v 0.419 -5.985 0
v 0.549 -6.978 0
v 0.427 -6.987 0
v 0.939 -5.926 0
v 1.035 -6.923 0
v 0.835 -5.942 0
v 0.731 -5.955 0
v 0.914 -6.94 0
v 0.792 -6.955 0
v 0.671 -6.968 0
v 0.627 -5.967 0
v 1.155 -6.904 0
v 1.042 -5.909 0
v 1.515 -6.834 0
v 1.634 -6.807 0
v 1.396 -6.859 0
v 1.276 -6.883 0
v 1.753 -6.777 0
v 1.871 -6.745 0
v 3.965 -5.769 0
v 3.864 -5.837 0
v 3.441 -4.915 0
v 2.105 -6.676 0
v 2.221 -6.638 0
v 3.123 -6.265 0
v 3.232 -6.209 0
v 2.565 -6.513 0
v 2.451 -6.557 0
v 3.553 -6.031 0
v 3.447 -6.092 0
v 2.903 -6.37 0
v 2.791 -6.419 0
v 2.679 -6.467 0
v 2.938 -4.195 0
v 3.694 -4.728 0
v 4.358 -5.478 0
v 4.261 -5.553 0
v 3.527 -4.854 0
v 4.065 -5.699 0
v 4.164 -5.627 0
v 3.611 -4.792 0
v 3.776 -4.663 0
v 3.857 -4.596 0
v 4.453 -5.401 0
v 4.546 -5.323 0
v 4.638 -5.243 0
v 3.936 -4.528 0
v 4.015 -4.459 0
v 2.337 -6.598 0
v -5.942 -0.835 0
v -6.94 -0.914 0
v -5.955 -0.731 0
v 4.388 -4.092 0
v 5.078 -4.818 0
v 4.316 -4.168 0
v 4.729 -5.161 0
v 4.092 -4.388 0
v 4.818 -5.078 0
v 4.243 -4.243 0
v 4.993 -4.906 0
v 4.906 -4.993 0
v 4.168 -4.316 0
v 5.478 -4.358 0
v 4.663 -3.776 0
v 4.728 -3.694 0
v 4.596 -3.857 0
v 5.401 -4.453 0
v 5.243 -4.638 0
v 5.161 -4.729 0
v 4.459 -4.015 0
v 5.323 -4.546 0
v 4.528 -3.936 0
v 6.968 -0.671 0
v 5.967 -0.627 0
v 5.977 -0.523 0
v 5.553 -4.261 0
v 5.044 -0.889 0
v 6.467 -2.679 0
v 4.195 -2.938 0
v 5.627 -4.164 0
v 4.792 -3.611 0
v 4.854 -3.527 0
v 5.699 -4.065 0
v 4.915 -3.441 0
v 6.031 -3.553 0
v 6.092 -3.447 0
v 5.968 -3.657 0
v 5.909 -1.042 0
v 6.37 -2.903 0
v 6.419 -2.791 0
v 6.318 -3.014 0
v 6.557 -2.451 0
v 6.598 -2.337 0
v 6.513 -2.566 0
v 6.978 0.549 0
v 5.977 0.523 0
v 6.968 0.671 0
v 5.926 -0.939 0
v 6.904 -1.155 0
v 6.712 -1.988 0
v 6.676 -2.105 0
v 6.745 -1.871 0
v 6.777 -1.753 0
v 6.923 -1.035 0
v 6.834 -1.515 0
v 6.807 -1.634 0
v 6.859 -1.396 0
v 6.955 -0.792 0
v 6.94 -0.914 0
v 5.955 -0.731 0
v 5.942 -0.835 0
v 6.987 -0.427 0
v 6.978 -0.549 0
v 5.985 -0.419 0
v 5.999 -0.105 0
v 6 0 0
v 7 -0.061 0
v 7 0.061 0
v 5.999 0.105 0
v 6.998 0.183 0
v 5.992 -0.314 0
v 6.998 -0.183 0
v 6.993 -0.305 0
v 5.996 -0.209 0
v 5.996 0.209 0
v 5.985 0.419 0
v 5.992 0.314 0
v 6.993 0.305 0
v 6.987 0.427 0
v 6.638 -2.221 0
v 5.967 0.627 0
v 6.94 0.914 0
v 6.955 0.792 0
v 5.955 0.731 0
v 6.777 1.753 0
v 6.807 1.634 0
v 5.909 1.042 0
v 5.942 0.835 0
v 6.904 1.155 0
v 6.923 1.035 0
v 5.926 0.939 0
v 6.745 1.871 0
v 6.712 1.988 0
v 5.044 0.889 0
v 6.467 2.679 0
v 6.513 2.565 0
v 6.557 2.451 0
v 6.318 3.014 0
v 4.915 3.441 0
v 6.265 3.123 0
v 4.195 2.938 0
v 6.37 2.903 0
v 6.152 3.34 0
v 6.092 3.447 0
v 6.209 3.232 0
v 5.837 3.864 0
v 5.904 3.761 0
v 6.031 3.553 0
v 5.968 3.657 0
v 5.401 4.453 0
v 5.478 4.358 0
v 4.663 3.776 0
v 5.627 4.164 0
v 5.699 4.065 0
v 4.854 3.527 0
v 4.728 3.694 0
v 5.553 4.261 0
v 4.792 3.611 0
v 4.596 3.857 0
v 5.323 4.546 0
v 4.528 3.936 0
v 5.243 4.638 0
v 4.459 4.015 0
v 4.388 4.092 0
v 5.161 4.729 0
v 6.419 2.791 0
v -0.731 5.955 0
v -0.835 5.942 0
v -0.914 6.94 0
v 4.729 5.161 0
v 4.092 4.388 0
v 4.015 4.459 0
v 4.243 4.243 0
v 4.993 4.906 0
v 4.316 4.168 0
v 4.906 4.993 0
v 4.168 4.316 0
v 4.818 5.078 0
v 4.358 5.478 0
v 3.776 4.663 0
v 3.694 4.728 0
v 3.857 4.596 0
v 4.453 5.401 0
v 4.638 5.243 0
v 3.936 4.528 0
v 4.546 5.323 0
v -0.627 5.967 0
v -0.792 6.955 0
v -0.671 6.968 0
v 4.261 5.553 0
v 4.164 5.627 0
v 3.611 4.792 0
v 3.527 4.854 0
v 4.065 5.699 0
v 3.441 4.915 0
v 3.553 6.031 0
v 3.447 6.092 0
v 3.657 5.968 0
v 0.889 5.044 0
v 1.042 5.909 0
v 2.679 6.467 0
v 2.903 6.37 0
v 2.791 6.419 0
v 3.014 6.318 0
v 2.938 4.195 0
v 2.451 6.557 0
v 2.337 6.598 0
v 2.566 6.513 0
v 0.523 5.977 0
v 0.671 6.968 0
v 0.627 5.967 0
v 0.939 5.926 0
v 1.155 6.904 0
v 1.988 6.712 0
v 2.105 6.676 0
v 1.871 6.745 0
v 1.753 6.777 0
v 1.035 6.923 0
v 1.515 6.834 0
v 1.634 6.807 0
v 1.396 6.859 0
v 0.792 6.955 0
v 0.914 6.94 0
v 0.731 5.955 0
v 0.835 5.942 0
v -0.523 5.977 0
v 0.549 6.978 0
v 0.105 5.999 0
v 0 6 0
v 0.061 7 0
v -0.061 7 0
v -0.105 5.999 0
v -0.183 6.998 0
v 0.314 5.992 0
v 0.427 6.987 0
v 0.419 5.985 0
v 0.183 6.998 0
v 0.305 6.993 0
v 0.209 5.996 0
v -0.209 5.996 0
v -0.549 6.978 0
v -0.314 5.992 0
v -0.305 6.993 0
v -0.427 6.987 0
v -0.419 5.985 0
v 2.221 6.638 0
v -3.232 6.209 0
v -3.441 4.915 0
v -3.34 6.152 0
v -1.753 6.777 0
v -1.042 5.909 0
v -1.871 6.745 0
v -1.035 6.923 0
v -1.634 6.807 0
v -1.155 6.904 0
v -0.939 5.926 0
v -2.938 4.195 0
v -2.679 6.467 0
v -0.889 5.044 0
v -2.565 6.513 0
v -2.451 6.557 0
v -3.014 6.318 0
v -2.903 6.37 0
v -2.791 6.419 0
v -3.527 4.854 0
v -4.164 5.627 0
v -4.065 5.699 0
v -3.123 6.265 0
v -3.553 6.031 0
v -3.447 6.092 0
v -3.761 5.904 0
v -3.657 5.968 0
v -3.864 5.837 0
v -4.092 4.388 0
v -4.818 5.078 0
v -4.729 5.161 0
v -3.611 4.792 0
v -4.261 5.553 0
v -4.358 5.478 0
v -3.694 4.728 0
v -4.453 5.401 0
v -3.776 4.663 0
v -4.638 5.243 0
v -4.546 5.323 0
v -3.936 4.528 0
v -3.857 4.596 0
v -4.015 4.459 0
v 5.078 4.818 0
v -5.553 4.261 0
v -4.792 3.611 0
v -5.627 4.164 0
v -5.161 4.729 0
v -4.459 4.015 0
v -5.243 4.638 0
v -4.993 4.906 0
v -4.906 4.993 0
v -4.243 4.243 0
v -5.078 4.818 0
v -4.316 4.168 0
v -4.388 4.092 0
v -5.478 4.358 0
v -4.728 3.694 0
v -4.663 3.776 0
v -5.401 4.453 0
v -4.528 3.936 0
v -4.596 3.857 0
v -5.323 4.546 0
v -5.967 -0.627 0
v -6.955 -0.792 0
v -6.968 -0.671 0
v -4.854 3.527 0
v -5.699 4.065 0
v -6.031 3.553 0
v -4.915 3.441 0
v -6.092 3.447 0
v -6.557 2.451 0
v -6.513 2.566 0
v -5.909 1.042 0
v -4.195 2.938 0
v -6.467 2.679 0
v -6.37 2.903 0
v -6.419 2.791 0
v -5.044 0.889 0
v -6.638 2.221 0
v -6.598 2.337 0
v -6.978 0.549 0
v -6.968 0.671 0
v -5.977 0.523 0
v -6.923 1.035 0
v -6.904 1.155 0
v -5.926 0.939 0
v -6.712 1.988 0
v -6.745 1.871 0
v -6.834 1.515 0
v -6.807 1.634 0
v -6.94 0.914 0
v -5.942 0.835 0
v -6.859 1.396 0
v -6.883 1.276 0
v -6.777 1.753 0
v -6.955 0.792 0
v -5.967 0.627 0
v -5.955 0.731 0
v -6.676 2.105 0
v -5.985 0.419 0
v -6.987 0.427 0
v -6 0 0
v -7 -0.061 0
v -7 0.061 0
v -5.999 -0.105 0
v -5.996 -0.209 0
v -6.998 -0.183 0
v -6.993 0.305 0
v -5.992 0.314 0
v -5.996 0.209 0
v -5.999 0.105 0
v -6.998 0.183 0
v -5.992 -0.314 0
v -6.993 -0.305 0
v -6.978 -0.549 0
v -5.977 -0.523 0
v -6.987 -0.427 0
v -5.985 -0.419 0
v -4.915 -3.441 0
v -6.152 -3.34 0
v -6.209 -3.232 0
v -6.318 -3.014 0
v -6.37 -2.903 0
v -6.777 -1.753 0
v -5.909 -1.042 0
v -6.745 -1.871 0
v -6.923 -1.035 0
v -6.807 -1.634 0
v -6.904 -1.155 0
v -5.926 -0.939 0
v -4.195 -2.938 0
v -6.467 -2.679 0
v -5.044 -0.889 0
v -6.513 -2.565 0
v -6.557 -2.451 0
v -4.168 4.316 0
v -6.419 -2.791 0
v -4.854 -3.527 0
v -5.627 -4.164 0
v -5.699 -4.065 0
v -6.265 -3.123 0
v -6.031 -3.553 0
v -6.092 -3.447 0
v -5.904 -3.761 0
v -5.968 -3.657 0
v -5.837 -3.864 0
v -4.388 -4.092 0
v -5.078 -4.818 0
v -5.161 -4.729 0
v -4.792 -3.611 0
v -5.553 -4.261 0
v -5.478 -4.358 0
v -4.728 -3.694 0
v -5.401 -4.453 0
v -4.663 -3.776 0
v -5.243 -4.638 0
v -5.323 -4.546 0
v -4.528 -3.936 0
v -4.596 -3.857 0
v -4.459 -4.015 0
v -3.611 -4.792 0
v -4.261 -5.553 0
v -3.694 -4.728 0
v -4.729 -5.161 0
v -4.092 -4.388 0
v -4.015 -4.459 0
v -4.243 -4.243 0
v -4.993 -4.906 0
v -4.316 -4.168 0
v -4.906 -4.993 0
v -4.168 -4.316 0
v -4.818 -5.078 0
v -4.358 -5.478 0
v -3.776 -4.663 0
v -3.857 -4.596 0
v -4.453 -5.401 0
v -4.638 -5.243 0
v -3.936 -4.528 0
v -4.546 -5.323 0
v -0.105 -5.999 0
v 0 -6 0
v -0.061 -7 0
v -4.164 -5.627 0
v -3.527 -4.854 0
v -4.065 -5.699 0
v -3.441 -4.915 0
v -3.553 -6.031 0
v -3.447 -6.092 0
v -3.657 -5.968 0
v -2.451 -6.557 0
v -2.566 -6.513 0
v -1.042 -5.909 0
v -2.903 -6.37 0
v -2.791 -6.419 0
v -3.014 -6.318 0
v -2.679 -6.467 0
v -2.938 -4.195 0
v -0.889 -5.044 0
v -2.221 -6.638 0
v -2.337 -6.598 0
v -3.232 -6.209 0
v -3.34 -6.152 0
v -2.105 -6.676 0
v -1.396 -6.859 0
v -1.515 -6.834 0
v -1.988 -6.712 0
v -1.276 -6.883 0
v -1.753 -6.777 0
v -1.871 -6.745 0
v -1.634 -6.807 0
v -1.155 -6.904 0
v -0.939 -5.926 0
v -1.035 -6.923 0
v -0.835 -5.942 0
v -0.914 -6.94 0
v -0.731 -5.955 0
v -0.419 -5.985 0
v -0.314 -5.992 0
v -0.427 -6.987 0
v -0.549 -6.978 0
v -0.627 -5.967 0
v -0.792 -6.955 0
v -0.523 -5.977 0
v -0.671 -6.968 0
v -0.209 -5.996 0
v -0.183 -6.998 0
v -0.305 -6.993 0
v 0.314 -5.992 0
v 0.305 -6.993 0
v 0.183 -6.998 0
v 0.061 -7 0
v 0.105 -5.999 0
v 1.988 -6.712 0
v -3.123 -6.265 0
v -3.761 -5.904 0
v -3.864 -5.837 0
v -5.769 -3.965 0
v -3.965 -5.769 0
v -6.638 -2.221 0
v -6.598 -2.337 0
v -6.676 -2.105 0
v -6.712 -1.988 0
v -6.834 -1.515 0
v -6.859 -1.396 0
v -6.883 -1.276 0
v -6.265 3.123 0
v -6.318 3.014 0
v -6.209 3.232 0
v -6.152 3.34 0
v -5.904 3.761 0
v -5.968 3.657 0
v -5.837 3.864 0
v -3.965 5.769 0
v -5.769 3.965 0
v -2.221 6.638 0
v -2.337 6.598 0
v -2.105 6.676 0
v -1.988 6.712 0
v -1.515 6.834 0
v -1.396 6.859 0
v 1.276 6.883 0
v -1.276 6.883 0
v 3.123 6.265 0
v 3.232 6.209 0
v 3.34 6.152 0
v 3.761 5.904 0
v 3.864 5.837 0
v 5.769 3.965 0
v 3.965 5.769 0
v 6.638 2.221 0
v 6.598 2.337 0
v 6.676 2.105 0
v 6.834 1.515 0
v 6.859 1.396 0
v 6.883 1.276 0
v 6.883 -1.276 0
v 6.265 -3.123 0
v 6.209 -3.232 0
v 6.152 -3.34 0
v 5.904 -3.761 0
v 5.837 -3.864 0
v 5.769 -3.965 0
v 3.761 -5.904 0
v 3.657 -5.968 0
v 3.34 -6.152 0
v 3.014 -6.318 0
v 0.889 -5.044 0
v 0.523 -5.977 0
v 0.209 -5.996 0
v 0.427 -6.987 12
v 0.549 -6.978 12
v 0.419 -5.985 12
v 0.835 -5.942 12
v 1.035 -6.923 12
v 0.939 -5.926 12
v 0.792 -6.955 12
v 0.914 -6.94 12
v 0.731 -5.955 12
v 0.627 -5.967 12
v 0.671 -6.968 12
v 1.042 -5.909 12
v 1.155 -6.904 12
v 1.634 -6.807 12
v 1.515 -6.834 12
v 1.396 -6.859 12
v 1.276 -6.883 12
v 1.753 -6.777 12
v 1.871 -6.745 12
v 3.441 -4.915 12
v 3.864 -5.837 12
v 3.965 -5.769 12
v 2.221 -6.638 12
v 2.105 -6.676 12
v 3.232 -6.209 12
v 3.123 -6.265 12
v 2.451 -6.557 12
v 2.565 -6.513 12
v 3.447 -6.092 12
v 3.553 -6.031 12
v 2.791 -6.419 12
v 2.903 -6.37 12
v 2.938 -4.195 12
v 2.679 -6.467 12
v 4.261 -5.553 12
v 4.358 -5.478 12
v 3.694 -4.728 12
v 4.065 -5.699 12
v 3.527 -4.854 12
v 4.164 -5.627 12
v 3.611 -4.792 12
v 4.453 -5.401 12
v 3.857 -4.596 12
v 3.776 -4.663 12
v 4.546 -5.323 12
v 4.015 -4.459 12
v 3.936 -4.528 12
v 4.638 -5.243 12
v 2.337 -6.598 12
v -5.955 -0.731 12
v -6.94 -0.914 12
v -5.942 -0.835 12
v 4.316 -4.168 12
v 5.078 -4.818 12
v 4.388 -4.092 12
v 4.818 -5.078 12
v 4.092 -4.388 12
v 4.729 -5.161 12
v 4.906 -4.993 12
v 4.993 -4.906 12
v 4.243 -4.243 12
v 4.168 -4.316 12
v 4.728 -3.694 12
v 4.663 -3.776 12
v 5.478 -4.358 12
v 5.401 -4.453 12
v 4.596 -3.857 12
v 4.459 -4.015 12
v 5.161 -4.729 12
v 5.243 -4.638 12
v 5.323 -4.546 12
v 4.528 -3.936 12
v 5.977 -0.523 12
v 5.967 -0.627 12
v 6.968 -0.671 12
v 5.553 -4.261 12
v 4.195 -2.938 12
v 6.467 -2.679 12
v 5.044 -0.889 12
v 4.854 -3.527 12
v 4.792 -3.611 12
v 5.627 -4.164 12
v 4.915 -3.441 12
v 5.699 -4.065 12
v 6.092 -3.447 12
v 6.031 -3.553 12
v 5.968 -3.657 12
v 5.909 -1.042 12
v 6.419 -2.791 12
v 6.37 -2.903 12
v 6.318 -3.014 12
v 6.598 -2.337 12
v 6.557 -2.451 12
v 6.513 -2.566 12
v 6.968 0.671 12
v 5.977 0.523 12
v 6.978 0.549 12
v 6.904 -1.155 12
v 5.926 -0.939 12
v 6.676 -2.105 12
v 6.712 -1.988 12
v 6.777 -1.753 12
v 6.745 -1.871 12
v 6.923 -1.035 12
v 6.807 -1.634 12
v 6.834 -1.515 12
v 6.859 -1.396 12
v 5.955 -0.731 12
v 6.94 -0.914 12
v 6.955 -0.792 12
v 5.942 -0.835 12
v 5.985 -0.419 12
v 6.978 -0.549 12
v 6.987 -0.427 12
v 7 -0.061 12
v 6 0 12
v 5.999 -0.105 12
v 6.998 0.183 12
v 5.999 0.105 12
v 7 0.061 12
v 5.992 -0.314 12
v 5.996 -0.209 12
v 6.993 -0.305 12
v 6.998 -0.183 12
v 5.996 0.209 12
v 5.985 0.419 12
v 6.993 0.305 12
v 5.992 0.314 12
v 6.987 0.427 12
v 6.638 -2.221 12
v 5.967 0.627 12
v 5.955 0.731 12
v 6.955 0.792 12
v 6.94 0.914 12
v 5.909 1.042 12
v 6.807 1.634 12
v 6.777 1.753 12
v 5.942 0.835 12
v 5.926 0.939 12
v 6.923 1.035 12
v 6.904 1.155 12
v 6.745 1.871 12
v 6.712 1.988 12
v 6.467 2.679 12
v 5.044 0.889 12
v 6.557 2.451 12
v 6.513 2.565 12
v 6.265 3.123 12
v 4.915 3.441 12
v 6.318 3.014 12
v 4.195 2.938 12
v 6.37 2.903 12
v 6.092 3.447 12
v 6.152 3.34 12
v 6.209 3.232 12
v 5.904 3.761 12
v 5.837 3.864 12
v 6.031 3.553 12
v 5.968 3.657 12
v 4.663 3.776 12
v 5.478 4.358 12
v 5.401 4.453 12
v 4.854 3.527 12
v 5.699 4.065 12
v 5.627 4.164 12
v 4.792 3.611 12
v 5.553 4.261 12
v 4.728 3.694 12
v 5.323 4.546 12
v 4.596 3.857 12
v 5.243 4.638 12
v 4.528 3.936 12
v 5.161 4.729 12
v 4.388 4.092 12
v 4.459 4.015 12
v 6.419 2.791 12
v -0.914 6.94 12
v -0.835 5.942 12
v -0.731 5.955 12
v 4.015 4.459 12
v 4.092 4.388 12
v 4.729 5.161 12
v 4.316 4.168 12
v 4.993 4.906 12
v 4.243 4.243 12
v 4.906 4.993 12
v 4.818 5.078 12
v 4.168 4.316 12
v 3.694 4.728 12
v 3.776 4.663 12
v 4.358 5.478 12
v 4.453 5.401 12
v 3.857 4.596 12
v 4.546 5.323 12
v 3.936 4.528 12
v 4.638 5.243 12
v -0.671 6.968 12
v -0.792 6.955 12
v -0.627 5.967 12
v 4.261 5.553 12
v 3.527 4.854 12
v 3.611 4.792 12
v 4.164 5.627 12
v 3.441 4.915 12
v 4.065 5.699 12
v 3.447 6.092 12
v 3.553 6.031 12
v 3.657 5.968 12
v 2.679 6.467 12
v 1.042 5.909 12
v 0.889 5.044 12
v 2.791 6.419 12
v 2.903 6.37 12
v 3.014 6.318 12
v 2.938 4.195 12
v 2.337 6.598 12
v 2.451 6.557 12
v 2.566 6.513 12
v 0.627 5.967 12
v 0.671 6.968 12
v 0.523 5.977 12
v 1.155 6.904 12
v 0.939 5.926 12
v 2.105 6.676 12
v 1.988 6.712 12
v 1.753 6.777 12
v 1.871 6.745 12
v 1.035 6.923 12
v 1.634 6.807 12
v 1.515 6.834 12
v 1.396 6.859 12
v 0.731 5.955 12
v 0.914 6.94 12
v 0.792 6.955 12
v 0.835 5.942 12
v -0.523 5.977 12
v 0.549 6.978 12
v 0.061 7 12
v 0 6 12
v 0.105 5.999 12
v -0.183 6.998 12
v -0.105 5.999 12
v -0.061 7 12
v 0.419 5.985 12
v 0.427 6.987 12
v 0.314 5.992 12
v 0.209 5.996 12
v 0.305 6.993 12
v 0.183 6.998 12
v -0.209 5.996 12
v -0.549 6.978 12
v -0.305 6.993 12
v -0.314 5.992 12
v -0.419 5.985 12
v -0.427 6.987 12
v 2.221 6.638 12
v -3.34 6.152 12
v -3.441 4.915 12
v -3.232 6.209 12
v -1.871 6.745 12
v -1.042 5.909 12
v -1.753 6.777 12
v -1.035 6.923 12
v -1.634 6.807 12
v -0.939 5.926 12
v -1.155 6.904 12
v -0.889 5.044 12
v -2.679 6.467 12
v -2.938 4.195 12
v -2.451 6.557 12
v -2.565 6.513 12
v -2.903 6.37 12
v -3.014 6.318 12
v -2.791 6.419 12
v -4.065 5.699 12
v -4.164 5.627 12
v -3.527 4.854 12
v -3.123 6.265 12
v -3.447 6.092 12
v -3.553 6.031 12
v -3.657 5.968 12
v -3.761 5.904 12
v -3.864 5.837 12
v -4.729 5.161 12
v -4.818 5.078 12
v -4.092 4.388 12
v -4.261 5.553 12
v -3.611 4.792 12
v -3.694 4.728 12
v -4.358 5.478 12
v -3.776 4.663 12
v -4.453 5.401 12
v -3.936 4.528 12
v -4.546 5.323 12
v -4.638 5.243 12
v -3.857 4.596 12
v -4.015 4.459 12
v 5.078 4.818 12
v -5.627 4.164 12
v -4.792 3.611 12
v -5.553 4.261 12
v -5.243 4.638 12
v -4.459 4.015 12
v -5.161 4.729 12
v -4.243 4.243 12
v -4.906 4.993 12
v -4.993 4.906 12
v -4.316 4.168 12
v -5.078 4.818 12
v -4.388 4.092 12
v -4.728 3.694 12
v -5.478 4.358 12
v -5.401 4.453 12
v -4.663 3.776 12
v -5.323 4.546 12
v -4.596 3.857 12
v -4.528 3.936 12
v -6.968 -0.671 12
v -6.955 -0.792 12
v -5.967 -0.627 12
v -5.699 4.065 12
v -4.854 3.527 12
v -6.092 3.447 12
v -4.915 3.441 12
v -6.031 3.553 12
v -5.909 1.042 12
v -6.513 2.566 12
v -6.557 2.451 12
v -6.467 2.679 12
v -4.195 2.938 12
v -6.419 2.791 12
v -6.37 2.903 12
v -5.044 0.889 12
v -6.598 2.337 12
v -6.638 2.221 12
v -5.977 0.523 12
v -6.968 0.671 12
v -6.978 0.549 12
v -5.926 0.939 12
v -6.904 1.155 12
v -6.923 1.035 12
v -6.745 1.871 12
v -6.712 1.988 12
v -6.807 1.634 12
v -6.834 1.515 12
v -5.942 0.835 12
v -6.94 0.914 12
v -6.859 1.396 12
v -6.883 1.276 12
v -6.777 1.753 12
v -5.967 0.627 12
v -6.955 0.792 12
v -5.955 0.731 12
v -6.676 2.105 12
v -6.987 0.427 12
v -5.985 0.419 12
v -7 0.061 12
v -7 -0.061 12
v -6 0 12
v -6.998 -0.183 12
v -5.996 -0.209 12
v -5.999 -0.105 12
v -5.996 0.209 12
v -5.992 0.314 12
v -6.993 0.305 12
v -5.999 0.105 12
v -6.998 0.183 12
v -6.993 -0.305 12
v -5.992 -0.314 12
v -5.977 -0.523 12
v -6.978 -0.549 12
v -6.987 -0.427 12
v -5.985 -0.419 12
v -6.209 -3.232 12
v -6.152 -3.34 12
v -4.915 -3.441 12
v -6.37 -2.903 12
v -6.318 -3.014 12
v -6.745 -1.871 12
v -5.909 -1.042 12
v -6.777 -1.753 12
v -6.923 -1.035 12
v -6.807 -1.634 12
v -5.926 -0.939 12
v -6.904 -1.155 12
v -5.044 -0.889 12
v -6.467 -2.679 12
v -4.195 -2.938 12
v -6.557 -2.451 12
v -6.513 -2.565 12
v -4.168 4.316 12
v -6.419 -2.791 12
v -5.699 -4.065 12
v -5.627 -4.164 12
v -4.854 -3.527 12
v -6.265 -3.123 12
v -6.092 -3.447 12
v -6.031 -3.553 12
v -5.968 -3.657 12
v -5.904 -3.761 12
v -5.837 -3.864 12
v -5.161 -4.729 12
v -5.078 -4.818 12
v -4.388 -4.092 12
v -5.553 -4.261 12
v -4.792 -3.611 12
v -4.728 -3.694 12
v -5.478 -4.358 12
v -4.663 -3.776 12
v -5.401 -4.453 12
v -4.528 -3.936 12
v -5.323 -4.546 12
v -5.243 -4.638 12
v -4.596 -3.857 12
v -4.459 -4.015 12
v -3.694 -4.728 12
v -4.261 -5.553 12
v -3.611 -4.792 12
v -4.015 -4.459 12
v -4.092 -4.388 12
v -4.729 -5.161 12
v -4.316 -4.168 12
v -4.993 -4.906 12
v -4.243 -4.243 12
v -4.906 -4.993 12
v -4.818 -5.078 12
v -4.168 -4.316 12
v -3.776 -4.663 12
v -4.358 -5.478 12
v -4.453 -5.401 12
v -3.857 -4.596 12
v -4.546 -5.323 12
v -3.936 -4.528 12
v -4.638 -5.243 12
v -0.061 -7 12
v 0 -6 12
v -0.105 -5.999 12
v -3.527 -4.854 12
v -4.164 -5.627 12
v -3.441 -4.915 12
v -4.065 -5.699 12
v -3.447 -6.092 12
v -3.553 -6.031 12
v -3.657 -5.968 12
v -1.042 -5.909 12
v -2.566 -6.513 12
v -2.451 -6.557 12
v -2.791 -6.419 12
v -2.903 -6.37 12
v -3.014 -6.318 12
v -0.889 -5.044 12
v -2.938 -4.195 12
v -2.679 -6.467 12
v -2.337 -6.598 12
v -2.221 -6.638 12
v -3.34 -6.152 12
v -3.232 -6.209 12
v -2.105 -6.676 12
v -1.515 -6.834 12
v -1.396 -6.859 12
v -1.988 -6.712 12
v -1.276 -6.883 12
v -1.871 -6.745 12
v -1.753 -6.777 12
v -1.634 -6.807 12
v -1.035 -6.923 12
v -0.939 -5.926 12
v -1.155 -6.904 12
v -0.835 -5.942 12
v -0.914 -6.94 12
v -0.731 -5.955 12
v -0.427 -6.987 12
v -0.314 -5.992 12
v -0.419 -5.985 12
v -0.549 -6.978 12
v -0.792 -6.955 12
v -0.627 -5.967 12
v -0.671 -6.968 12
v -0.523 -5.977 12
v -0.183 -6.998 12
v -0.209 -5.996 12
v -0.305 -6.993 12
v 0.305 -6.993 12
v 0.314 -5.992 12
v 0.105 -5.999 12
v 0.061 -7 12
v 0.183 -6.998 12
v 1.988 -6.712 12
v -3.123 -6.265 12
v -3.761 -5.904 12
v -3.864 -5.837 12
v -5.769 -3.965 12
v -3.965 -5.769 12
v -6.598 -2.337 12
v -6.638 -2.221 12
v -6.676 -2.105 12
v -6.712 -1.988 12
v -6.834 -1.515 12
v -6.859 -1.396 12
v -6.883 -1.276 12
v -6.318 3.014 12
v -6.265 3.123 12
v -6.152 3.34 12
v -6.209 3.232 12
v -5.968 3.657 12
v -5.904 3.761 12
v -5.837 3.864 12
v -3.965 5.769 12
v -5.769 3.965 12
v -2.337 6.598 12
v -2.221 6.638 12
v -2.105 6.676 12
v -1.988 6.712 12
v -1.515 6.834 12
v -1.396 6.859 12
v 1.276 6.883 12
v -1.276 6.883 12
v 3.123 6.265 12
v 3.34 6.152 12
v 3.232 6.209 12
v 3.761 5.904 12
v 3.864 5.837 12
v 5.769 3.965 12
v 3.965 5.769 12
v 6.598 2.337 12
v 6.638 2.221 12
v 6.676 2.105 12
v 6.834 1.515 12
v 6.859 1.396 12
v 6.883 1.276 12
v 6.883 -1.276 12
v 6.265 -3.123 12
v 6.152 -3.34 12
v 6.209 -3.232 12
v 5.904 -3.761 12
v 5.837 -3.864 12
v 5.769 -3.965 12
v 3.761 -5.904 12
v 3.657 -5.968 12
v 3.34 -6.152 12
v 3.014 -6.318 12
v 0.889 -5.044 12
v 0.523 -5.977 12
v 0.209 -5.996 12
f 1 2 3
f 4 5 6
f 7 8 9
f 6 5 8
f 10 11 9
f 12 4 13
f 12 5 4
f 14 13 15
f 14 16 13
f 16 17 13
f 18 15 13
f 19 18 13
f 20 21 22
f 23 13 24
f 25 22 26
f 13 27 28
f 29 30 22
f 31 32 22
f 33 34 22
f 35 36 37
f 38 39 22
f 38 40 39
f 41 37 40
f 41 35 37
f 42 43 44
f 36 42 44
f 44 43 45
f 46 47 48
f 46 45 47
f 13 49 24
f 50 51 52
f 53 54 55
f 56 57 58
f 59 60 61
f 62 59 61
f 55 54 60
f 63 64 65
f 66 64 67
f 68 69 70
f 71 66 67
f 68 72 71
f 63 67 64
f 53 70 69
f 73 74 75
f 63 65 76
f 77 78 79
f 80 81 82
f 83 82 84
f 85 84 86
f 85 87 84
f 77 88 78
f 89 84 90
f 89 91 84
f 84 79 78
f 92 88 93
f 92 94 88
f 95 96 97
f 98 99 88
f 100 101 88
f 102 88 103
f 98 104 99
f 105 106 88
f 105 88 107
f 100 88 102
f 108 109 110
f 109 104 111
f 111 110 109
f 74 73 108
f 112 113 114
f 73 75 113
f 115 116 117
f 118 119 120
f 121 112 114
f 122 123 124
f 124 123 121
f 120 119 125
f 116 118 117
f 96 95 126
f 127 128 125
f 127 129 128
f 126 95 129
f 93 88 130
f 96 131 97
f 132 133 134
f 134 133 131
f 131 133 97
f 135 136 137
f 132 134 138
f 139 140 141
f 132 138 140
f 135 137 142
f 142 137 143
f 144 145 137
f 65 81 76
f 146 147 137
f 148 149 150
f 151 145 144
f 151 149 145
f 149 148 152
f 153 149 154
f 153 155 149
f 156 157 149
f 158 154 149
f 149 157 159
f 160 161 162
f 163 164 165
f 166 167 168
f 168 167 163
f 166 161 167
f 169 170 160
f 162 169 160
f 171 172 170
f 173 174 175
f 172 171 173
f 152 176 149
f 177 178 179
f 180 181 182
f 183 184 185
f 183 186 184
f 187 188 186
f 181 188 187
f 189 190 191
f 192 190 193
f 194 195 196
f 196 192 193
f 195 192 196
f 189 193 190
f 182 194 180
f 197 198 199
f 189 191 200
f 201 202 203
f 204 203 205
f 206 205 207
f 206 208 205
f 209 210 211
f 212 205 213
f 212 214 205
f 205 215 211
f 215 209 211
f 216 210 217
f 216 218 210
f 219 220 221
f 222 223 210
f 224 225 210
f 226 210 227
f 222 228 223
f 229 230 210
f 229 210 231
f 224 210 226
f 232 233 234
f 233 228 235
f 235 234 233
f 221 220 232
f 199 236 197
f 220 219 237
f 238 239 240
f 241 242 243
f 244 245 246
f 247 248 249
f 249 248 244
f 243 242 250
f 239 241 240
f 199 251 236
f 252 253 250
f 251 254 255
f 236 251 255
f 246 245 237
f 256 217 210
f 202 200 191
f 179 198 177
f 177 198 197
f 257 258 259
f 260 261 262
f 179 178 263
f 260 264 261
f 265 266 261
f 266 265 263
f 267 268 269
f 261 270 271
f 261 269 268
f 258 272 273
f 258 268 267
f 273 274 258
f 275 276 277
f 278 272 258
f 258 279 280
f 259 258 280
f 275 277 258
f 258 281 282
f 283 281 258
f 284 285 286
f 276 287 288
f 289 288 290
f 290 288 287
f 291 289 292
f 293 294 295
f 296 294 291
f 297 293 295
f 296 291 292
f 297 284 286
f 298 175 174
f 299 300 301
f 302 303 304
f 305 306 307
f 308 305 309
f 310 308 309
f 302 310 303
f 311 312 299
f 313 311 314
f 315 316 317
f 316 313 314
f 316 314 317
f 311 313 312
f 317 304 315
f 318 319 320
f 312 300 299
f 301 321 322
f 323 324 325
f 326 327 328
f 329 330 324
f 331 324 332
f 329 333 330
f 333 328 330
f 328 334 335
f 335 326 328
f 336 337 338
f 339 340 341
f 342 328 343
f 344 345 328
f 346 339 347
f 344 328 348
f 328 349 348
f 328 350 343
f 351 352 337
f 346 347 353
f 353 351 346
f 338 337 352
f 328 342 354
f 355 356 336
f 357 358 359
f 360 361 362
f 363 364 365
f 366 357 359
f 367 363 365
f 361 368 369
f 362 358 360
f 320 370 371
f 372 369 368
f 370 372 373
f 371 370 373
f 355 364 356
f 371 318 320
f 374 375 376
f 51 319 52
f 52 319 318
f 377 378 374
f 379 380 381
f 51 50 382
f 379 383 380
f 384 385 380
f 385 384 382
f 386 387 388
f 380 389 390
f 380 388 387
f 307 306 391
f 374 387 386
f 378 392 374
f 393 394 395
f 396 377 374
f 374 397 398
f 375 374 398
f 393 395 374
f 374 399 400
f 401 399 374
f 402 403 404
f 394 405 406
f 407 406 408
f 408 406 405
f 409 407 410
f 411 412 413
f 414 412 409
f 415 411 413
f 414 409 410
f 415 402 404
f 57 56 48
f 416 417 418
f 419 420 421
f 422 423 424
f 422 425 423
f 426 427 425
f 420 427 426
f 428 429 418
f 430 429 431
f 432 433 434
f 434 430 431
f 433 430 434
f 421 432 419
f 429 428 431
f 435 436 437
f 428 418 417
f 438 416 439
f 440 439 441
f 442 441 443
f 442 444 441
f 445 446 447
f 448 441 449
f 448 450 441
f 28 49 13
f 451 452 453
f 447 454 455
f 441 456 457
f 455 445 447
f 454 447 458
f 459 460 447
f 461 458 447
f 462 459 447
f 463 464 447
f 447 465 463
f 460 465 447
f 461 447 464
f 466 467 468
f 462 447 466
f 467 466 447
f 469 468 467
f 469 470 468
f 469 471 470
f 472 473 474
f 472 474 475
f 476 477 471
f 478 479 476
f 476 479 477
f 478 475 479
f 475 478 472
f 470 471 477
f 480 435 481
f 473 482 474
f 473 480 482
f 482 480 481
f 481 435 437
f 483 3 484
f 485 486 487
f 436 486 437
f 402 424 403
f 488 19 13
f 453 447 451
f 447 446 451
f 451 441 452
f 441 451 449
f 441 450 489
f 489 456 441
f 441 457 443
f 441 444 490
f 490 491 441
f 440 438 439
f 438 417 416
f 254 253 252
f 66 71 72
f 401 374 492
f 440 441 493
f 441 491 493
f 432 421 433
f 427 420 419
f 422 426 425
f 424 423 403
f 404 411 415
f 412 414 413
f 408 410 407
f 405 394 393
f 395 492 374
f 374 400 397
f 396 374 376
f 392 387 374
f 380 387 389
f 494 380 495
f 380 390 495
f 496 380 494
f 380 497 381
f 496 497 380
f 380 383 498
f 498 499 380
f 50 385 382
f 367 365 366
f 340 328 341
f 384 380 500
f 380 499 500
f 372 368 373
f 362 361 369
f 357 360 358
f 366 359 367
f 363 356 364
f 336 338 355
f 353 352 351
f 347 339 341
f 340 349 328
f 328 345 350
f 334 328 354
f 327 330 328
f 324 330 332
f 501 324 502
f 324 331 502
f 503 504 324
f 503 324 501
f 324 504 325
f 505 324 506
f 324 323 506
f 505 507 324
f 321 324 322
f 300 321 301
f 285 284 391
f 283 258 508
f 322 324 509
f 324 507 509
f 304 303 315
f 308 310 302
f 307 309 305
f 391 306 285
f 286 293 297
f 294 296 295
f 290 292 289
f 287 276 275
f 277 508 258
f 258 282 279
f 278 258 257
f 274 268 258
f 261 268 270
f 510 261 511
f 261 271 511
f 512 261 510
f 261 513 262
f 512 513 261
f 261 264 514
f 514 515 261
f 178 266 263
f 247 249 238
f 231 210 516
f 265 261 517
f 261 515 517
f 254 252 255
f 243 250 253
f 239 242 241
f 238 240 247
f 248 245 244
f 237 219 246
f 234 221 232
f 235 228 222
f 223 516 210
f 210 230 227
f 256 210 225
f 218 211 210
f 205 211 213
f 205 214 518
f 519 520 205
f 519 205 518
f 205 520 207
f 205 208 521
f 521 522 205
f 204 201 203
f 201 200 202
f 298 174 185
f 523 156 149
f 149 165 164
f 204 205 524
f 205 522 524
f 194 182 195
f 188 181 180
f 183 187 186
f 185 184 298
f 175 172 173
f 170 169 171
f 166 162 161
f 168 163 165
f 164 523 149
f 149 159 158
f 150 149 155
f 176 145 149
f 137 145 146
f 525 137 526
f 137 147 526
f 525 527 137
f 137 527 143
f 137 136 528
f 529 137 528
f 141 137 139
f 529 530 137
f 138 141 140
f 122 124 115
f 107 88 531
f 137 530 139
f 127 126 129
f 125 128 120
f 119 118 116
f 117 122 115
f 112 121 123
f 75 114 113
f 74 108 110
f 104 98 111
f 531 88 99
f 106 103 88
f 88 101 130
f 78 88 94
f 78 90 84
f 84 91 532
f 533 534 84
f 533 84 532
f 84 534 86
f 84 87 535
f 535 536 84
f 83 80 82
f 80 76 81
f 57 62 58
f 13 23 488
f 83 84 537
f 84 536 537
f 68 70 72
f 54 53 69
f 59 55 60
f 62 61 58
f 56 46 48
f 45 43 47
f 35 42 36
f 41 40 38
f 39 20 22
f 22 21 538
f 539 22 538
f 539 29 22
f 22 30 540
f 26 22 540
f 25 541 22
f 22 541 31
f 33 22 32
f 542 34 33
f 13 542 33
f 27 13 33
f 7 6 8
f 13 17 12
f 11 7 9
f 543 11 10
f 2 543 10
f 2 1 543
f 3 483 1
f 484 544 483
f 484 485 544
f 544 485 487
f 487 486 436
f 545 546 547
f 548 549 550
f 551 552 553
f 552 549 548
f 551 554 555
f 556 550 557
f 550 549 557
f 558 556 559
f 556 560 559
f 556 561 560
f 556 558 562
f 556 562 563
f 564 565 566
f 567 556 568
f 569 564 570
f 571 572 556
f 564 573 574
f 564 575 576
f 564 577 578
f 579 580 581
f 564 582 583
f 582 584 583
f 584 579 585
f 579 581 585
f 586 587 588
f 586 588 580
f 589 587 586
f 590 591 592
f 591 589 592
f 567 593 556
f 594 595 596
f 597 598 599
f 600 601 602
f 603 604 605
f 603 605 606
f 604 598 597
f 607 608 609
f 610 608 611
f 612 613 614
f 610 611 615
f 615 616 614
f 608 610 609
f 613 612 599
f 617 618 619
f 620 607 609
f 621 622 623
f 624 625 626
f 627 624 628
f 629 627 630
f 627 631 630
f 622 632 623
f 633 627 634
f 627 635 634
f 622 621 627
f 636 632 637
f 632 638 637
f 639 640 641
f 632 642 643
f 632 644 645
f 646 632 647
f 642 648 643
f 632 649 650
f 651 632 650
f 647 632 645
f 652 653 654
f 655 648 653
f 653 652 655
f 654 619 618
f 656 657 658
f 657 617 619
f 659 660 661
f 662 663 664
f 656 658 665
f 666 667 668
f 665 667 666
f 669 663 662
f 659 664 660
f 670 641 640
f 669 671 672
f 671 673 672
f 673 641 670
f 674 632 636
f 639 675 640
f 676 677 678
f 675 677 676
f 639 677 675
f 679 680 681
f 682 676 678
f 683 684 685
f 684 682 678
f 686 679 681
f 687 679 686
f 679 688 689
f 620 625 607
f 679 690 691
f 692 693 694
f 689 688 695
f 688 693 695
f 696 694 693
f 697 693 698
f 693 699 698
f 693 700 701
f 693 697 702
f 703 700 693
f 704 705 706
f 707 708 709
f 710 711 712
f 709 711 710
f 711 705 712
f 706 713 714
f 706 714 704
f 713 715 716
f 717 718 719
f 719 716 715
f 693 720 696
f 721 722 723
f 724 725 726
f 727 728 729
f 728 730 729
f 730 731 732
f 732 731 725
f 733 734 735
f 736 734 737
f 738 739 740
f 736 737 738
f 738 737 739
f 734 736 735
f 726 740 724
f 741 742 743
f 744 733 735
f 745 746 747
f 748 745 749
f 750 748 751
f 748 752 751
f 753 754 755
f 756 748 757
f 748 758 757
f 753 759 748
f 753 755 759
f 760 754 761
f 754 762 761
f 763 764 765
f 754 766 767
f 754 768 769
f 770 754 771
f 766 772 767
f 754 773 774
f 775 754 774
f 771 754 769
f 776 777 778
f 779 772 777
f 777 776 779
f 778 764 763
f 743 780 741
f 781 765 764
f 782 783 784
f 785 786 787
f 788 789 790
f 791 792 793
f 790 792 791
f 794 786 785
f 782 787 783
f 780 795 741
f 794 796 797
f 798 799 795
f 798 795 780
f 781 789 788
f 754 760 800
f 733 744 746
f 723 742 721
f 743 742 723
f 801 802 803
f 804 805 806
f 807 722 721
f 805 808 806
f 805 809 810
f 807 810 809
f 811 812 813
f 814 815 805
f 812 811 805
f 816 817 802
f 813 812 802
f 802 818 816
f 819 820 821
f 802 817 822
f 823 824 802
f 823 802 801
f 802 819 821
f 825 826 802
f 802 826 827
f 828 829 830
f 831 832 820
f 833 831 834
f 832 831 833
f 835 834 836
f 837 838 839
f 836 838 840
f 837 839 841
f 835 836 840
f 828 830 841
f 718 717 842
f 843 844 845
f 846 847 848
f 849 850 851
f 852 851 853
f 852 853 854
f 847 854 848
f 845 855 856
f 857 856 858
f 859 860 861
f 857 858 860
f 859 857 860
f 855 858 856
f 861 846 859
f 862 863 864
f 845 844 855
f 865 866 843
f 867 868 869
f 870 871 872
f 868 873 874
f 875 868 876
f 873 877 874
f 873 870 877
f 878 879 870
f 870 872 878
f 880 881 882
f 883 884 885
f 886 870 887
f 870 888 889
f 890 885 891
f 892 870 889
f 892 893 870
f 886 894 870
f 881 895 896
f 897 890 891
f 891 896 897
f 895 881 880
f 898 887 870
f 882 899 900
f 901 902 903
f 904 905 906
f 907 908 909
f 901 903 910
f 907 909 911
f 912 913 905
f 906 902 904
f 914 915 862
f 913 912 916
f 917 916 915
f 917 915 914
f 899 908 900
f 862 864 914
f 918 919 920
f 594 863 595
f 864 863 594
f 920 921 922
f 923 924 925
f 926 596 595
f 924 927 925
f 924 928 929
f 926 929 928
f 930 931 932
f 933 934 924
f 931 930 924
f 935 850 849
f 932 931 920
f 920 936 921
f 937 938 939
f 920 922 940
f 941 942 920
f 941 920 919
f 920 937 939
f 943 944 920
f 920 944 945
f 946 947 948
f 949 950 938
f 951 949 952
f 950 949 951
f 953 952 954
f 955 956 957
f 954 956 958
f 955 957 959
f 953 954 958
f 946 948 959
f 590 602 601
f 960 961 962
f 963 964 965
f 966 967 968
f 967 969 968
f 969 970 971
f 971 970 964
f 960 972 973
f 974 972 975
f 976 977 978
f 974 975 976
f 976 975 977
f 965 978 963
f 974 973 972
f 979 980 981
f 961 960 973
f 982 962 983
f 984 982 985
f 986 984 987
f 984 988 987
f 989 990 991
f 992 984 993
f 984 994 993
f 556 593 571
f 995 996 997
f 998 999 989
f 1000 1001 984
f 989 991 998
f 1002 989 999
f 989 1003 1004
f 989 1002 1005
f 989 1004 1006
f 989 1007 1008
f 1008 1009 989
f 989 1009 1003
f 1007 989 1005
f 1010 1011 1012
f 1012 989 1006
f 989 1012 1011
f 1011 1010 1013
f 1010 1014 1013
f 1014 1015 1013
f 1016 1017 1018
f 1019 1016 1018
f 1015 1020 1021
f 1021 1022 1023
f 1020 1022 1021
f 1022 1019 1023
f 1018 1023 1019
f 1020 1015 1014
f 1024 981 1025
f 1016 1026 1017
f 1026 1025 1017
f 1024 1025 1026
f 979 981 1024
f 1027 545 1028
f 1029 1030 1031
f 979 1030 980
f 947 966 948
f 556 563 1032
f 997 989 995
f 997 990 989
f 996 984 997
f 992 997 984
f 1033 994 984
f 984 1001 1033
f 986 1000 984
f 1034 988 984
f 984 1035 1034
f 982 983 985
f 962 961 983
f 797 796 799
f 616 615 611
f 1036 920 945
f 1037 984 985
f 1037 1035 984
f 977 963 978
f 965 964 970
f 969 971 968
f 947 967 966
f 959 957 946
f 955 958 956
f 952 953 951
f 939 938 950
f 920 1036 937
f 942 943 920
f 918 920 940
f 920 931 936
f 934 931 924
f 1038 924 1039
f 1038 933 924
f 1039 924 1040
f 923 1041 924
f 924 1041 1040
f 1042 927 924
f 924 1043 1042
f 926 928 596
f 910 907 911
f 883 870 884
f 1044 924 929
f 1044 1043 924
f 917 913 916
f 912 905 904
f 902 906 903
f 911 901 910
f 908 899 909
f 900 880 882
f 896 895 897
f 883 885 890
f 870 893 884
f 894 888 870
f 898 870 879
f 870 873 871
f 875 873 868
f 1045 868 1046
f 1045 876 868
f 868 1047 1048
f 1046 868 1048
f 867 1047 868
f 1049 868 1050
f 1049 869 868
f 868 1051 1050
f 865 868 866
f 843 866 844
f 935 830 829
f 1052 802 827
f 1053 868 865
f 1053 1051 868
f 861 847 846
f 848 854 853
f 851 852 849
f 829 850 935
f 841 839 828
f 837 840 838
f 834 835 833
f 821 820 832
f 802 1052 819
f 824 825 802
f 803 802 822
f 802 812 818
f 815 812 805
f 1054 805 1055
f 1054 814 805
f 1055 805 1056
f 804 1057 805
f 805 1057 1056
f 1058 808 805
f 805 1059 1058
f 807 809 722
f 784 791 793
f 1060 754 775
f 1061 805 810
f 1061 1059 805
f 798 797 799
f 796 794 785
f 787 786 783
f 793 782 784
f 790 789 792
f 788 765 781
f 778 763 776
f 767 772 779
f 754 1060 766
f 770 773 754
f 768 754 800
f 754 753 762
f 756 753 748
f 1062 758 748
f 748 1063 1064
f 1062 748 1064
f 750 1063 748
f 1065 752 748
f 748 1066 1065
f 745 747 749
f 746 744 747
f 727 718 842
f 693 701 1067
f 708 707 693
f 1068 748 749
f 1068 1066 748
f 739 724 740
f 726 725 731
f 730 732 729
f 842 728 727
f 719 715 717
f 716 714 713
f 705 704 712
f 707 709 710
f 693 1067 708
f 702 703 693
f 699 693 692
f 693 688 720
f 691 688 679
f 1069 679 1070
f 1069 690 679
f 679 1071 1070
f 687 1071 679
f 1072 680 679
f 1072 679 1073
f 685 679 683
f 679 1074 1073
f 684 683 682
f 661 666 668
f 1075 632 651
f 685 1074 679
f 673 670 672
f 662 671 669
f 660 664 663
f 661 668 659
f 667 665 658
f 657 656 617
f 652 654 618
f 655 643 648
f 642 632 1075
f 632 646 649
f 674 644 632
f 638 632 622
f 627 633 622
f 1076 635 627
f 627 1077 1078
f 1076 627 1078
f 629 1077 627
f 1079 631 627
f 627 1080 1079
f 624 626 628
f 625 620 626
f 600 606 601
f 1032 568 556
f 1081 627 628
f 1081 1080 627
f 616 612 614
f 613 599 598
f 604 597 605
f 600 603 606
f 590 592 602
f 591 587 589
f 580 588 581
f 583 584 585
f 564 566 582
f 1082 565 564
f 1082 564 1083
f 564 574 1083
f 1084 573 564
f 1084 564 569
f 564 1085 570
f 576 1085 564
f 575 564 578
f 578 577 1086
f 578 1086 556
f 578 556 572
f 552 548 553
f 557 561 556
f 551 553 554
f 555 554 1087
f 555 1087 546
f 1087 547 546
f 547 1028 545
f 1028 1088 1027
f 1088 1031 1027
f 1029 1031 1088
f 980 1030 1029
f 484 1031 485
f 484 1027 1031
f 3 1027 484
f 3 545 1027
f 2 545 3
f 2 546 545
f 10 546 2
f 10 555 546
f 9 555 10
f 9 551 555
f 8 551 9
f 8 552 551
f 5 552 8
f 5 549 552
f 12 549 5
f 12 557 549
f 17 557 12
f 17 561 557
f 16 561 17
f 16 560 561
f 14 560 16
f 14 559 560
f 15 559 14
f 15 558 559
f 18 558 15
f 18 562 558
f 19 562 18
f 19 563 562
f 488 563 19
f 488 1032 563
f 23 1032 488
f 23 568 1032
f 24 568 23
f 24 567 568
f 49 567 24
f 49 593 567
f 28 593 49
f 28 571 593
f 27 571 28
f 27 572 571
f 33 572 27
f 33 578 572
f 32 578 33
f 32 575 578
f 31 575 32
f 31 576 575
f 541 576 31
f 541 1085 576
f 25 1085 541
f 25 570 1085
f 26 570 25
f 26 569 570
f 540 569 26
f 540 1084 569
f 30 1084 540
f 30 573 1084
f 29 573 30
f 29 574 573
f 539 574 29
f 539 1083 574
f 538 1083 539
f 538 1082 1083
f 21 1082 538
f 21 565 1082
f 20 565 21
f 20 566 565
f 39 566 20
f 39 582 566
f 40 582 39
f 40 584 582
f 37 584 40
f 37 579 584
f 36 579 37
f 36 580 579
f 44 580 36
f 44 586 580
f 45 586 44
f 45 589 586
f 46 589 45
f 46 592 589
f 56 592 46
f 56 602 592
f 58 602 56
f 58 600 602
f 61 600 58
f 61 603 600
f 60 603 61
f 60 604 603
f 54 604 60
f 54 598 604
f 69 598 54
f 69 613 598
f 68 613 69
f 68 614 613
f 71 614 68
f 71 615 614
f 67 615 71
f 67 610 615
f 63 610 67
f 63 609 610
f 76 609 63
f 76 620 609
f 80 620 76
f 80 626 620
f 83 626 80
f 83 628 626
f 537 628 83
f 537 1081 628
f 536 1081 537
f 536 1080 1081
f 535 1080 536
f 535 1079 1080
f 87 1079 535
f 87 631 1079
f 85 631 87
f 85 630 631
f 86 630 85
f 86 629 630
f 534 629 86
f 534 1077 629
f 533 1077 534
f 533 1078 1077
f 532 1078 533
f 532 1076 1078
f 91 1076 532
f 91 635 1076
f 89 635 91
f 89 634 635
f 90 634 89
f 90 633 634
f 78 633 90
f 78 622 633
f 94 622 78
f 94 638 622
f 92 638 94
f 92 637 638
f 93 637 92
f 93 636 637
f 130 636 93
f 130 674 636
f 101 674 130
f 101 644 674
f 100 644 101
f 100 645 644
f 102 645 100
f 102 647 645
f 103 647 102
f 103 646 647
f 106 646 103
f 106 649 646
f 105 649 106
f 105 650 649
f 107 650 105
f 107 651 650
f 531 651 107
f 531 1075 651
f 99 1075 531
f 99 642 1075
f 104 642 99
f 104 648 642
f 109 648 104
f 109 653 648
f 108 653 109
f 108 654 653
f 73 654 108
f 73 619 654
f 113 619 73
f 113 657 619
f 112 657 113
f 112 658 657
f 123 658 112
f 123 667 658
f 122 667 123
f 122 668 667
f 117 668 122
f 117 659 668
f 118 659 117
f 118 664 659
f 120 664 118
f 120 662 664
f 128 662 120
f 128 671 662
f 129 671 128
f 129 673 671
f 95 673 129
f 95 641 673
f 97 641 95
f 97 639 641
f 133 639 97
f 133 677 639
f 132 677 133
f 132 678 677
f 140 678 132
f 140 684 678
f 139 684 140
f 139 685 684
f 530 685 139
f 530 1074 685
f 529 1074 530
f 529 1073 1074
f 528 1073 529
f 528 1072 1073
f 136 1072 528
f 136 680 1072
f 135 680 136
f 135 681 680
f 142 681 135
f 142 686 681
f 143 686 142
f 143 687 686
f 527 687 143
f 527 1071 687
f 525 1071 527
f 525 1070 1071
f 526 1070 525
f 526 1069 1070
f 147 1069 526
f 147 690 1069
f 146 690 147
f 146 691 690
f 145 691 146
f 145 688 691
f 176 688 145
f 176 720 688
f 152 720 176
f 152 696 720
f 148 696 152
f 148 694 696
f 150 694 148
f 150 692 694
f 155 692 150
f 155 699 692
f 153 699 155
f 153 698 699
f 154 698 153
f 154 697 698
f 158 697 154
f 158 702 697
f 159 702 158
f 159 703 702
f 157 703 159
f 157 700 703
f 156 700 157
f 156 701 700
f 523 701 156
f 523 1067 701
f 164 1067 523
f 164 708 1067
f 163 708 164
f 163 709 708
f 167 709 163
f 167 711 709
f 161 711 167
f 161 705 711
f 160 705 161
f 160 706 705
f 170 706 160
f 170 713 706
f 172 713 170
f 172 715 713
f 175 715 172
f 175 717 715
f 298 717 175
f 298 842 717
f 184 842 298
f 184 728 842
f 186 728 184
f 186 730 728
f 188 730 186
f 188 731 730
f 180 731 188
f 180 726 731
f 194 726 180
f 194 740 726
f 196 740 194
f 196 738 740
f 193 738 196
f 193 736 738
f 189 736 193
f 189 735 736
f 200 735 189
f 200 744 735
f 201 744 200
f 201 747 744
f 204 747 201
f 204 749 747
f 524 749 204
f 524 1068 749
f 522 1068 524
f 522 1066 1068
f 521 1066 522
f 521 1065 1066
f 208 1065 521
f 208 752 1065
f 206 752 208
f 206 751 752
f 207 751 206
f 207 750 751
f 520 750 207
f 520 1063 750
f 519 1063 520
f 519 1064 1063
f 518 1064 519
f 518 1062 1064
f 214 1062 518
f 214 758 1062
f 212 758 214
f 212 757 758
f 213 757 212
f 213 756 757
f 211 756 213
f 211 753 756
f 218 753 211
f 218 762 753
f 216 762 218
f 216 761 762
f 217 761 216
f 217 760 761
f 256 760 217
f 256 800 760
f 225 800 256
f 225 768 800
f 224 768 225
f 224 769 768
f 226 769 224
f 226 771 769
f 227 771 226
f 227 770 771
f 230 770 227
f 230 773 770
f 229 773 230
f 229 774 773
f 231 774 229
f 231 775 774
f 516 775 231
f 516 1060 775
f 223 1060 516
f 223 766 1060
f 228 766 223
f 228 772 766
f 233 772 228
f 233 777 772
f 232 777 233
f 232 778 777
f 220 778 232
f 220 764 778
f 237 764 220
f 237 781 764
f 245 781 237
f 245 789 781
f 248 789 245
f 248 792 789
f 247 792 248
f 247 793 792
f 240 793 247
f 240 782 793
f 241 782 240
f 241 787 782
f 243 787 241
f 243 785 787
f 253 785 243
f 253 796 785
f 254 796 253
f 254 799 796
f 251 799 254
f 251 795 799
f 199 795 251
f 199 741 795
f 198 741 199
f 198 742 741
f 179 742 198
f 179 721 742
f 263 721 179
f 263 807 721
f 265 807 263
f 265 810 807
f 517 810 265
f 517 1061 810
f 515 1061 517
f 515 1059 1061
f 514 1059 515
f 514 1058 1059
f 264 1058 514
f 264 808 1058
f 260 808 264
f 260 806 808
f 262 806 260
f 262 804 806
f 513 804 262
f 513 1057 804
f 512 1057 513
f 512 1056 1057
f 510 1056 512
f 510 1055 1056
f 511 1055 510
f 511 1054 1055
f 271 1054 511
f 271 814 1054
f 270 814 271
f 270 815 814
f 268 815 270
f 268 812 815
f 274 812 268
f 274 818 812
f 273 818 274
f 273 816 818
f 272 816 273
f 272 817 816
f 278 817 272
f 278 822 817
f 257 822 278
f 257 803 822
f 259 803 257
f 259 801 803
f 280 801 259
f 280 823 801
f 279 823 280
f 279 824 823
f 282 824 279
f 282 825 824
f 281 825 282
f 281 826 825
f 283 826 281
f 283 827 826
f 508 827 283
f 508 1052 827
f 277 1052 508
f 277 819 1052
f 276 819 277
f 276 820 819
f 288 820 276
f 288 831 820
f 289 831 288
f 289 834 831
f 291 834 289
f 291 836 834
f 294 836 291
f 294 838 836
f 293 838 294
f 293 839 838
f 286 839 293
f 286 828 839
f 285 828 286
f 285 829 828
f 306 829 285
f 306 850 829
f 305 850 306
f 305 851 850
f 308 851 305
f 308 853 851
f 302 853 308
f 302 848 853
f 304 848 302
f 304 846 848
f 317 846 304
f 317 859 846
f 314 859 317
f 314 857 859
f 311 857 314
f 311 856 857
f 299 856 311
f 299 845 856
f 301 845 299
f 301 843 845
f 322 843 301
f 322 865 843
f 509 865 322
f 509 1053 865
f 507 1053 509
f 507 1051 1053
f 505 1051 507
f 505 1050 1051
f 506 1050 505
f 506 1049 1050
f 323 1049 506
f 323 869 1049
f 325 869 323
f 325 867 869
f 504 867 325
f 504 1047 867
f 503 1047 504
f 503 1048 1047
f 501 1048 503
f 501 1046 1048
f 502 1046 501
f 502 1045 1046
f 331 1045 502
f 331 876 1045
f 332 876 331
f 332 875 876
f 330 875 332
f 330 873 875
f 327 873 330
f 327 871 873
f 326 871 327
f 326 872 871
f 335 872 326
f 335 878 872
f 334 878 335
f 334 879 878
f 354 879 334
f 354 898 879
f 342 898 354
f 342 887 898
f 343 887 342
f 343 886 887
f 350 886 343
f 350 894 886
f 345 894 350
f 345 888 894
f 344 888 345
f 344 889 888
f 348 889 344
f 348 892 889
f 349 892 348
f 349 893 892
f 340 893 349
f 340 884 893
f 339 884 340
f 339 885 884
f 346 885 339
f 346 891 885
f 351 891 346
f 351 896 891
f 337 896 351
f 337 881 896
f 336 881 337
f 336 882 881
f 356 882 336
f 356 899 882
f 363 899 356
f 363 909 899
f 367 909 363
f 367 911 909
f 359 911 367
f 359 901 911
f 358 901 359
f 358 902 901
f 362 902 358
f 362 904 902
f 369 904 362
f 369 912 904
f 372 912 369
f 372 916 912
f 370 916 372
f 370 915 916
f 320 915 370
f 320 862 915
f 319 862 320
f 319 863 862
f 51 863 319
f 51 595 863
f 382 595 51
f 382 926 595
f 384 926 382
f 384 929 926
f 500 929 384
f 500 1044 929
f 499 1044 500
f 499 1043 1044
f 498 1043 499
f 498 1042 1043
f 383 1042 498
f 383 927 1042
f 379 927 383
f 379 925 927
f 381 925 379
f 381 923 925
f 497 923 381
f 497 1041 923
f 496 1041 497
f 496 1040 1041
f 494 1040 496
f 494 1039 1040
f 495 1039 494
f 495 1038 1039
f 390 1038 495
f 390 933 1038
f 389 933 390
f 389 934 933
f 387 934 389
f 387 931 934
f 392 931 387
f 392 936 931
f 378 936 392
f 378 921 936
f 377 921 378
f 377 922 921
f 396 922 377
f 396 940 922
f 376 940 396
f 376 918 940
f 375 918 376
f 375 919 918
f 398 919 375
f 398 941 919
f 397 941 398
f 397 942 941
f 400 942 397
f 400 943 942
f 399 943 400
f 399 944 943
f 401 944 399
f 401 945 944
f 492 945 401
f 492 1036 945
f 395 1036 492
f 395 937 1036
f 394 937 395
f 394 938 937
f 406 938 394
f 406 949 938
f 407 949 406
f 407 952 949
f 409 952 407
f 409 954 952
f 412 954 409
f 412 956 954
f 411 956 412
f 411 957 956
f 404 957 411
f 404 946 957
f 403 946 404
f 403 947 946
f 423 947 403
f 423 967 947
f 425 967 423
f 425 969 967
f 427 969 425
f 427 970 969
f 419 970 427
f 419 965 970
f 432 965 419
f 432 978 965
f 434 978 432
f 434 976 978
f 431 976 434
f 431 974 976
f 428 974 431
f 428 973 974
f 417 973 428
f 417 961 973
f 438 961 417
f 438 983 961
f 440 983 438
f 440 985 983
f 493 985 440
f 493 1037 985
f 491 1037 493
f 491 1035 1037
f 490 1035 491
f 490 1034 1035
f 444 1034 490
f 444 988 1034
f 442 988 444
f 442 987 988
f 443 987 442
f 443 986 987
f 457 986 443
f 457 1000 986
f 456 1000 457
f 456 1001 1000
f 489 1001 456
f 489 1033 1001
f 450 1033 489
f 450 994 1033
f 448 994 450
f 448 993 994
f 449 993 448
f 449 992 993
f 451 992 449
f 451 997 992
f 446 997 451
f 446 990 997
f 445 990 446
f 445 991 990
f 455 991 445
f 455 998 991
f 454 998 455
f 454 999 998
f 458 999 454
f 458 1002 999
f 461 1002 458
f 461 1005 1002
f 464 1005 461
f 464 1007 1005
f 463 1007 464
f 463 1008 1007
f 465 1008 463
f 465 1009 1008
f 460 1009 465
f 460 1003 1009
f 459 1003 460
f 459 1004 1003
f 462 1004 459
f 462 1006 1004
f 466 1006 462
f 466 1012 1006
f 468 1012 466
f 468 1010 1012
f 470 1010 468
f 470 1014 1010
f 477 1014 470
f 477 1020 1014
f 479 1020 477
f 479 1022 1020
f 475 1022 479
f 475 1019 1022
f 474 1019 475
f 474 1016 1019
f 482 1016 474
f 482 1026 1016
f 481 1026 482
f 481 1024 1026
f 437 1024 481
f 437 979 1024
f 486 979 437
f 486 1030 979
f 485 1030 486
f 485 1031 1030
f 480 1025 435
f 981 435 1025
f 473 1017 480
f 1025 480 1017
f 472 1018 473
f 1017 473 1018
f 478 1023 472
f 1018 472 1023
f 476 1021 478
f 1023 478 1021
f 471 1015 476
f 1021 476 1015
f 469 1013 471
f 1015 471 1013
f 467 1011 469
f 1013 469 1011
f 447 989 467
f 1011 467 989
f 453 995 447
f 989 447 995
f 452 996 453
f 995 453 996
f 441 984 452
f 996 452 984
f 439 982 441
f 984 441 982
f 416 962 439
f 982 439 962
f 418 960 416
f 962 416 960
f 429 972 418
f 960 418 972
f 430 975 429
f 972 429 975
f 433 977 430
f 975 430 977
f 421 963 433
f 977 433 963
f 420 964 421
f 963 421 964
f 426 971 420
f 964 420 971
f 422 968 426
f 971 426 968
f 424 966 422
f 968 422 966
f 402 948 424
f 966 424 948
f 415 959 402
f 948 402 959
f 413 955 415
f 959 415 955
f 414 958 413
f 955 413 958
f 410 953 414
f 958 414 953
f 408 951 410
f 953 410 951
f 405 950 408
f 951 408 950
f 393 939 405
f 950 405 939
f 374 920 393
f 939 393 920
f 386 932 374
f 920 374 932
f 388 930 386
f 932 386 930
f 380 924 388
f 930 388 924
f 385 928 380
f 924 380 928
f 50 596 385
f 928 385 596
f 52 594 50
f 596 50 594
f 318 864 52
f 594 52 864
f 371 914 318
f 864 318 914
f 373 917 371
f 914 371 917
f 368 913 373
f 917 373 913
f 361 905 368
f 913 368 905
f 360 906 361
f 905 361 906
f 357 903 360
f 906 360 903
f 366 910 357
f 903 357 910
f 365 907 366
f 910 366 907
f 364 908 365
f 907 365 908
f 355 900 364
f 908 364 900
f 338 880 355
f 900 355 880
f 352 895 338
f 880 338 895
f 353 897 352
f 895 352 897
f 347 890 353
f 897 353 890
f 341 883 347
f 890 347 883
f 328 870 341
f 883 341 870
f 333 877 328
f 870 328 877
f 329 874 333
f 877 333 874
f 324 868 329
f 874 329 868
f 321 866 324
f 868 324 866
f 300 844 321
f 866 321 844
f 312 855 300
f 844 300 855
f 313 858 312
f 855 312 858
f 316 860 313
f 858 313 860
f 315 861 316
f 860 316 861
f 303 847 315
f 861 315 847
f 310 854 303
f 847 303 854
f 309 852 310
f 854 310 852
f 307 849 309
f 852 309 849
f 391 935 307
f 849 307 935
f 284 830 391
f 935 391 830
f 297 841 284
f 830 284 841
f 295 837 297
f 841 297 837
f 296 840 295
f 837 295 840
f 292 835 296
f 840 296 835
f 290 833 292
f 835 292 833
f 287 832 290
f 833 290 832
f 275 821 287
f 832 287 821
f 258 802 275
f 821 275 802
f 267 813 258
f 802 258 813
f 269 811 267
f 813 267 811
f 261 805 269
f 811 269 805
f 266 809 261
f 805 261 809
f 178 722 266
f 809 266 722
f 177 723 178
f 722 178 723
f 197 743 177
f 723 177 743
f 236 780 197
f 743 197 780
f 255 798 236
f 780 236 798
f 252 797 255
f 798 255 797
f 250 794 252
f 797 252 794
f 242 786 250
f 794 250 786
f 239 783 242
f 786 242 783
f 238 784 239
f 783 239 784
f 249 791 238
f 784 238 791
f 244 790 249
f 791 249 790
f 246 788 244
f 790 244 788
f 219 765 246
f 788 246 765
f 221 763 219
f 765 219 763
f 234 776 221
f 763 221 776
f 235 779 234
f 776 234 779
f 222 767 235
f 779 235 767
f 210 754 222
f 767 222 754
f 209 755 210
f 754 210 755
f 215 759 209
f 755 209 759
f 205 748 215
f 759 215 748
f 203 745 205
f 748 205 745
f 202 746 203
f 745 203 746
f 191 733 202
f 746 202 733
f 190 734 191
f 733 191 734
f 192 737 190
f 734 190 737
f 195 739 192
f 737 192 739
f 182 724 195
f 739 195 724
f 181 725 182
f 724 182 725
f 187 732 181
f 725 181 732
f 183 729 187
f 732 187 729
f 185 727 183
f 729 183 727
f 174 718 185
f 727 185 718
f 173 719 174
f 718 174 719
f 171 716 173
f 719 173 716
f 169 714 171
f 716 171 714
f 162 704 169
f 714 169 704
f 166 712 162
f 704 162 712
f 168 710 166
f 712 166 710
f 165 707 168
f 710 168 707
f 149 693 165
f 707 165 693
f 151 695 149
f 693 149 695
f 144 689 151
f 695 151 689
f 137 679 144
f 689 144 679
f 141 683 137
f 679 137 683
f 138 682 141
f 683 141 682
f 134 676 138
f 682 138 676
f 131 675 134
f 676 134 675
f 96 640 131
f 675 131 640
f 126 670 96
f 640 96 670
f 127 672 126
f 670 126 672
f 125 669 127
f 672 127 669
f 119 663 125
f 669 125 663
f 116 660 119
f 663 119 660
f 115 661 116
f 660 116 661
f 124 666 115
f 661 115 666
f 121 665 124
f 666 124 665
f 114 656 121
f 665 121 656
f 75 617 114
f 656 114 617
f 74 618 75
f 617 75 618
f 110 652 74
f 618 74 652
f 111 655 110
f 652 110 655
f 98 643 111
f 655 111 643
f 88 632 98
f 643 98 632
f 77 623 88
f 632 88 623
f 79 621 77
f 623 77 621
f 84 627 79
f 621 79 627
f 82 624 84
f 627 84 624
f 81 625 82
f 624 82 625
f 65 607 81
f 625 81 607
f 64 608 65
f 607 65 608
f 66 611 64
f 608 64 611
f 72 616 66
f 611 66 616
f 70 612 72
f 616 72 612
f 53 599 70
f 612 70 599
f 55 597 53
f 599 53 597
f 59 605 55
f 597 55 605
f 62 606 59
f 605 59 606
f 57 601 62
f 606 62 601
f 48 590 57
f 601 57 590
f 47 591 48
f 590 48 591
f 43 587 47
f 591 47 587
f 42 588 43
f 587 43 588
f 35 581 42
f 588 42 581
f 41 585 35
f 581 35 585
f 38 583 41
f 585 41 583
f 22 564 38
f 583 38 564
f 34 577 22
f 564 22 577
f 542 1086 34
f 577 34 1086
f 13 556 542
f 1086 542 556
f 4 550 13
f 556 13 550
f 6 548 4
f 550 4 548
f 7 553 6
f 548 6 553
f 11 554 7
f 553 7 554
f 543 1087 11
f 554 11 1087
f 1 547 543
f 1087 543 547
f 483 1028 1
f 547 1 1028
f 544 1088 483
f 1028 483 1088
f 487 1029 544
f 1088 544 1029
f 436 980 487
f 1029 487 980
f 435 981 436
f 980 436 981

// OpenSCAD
old_style_body_ID=10;
old_style_body_OD=14;
new_style_body_slot_diameter=12;
body_height=12;


module pie(radius, arc_len, angle) {
    render() {
        rotate([0, 0, angle]) {
            intersection() {
                $fa=1;
                $fs=.1;
                circle(radius);
                difference() {
                    square(radius, radius);
                    rotate([0, 0, arc_len]) {
                        square(radius*2, radius*2);
                    }
                }
            }
        }
    }
}

module octagon(diameter) {
    intersection() {
        square(diameter, center=true);
        rotate([0, 0, -45]) {
            square(diameter, center=true);
        }
    }
}

module old_style_body(id, od) {
    rotate([0, 0, -45/2]) {

        difference() {
            $fa=1;
            $fs=.1;
            circle(od/2); // circle takes a radius
            octagon(id);
        }
    }
}

linear_extrude(height=body_height) {
    difference() {
        old_style_body(old_style_body_ID, old_style_body_OD);
    
        for (var = [0 : 360/8 : 360]) {
            pie(new_style_body_slot_diameter/2, 20, var-10);
            
        }
    }
}
